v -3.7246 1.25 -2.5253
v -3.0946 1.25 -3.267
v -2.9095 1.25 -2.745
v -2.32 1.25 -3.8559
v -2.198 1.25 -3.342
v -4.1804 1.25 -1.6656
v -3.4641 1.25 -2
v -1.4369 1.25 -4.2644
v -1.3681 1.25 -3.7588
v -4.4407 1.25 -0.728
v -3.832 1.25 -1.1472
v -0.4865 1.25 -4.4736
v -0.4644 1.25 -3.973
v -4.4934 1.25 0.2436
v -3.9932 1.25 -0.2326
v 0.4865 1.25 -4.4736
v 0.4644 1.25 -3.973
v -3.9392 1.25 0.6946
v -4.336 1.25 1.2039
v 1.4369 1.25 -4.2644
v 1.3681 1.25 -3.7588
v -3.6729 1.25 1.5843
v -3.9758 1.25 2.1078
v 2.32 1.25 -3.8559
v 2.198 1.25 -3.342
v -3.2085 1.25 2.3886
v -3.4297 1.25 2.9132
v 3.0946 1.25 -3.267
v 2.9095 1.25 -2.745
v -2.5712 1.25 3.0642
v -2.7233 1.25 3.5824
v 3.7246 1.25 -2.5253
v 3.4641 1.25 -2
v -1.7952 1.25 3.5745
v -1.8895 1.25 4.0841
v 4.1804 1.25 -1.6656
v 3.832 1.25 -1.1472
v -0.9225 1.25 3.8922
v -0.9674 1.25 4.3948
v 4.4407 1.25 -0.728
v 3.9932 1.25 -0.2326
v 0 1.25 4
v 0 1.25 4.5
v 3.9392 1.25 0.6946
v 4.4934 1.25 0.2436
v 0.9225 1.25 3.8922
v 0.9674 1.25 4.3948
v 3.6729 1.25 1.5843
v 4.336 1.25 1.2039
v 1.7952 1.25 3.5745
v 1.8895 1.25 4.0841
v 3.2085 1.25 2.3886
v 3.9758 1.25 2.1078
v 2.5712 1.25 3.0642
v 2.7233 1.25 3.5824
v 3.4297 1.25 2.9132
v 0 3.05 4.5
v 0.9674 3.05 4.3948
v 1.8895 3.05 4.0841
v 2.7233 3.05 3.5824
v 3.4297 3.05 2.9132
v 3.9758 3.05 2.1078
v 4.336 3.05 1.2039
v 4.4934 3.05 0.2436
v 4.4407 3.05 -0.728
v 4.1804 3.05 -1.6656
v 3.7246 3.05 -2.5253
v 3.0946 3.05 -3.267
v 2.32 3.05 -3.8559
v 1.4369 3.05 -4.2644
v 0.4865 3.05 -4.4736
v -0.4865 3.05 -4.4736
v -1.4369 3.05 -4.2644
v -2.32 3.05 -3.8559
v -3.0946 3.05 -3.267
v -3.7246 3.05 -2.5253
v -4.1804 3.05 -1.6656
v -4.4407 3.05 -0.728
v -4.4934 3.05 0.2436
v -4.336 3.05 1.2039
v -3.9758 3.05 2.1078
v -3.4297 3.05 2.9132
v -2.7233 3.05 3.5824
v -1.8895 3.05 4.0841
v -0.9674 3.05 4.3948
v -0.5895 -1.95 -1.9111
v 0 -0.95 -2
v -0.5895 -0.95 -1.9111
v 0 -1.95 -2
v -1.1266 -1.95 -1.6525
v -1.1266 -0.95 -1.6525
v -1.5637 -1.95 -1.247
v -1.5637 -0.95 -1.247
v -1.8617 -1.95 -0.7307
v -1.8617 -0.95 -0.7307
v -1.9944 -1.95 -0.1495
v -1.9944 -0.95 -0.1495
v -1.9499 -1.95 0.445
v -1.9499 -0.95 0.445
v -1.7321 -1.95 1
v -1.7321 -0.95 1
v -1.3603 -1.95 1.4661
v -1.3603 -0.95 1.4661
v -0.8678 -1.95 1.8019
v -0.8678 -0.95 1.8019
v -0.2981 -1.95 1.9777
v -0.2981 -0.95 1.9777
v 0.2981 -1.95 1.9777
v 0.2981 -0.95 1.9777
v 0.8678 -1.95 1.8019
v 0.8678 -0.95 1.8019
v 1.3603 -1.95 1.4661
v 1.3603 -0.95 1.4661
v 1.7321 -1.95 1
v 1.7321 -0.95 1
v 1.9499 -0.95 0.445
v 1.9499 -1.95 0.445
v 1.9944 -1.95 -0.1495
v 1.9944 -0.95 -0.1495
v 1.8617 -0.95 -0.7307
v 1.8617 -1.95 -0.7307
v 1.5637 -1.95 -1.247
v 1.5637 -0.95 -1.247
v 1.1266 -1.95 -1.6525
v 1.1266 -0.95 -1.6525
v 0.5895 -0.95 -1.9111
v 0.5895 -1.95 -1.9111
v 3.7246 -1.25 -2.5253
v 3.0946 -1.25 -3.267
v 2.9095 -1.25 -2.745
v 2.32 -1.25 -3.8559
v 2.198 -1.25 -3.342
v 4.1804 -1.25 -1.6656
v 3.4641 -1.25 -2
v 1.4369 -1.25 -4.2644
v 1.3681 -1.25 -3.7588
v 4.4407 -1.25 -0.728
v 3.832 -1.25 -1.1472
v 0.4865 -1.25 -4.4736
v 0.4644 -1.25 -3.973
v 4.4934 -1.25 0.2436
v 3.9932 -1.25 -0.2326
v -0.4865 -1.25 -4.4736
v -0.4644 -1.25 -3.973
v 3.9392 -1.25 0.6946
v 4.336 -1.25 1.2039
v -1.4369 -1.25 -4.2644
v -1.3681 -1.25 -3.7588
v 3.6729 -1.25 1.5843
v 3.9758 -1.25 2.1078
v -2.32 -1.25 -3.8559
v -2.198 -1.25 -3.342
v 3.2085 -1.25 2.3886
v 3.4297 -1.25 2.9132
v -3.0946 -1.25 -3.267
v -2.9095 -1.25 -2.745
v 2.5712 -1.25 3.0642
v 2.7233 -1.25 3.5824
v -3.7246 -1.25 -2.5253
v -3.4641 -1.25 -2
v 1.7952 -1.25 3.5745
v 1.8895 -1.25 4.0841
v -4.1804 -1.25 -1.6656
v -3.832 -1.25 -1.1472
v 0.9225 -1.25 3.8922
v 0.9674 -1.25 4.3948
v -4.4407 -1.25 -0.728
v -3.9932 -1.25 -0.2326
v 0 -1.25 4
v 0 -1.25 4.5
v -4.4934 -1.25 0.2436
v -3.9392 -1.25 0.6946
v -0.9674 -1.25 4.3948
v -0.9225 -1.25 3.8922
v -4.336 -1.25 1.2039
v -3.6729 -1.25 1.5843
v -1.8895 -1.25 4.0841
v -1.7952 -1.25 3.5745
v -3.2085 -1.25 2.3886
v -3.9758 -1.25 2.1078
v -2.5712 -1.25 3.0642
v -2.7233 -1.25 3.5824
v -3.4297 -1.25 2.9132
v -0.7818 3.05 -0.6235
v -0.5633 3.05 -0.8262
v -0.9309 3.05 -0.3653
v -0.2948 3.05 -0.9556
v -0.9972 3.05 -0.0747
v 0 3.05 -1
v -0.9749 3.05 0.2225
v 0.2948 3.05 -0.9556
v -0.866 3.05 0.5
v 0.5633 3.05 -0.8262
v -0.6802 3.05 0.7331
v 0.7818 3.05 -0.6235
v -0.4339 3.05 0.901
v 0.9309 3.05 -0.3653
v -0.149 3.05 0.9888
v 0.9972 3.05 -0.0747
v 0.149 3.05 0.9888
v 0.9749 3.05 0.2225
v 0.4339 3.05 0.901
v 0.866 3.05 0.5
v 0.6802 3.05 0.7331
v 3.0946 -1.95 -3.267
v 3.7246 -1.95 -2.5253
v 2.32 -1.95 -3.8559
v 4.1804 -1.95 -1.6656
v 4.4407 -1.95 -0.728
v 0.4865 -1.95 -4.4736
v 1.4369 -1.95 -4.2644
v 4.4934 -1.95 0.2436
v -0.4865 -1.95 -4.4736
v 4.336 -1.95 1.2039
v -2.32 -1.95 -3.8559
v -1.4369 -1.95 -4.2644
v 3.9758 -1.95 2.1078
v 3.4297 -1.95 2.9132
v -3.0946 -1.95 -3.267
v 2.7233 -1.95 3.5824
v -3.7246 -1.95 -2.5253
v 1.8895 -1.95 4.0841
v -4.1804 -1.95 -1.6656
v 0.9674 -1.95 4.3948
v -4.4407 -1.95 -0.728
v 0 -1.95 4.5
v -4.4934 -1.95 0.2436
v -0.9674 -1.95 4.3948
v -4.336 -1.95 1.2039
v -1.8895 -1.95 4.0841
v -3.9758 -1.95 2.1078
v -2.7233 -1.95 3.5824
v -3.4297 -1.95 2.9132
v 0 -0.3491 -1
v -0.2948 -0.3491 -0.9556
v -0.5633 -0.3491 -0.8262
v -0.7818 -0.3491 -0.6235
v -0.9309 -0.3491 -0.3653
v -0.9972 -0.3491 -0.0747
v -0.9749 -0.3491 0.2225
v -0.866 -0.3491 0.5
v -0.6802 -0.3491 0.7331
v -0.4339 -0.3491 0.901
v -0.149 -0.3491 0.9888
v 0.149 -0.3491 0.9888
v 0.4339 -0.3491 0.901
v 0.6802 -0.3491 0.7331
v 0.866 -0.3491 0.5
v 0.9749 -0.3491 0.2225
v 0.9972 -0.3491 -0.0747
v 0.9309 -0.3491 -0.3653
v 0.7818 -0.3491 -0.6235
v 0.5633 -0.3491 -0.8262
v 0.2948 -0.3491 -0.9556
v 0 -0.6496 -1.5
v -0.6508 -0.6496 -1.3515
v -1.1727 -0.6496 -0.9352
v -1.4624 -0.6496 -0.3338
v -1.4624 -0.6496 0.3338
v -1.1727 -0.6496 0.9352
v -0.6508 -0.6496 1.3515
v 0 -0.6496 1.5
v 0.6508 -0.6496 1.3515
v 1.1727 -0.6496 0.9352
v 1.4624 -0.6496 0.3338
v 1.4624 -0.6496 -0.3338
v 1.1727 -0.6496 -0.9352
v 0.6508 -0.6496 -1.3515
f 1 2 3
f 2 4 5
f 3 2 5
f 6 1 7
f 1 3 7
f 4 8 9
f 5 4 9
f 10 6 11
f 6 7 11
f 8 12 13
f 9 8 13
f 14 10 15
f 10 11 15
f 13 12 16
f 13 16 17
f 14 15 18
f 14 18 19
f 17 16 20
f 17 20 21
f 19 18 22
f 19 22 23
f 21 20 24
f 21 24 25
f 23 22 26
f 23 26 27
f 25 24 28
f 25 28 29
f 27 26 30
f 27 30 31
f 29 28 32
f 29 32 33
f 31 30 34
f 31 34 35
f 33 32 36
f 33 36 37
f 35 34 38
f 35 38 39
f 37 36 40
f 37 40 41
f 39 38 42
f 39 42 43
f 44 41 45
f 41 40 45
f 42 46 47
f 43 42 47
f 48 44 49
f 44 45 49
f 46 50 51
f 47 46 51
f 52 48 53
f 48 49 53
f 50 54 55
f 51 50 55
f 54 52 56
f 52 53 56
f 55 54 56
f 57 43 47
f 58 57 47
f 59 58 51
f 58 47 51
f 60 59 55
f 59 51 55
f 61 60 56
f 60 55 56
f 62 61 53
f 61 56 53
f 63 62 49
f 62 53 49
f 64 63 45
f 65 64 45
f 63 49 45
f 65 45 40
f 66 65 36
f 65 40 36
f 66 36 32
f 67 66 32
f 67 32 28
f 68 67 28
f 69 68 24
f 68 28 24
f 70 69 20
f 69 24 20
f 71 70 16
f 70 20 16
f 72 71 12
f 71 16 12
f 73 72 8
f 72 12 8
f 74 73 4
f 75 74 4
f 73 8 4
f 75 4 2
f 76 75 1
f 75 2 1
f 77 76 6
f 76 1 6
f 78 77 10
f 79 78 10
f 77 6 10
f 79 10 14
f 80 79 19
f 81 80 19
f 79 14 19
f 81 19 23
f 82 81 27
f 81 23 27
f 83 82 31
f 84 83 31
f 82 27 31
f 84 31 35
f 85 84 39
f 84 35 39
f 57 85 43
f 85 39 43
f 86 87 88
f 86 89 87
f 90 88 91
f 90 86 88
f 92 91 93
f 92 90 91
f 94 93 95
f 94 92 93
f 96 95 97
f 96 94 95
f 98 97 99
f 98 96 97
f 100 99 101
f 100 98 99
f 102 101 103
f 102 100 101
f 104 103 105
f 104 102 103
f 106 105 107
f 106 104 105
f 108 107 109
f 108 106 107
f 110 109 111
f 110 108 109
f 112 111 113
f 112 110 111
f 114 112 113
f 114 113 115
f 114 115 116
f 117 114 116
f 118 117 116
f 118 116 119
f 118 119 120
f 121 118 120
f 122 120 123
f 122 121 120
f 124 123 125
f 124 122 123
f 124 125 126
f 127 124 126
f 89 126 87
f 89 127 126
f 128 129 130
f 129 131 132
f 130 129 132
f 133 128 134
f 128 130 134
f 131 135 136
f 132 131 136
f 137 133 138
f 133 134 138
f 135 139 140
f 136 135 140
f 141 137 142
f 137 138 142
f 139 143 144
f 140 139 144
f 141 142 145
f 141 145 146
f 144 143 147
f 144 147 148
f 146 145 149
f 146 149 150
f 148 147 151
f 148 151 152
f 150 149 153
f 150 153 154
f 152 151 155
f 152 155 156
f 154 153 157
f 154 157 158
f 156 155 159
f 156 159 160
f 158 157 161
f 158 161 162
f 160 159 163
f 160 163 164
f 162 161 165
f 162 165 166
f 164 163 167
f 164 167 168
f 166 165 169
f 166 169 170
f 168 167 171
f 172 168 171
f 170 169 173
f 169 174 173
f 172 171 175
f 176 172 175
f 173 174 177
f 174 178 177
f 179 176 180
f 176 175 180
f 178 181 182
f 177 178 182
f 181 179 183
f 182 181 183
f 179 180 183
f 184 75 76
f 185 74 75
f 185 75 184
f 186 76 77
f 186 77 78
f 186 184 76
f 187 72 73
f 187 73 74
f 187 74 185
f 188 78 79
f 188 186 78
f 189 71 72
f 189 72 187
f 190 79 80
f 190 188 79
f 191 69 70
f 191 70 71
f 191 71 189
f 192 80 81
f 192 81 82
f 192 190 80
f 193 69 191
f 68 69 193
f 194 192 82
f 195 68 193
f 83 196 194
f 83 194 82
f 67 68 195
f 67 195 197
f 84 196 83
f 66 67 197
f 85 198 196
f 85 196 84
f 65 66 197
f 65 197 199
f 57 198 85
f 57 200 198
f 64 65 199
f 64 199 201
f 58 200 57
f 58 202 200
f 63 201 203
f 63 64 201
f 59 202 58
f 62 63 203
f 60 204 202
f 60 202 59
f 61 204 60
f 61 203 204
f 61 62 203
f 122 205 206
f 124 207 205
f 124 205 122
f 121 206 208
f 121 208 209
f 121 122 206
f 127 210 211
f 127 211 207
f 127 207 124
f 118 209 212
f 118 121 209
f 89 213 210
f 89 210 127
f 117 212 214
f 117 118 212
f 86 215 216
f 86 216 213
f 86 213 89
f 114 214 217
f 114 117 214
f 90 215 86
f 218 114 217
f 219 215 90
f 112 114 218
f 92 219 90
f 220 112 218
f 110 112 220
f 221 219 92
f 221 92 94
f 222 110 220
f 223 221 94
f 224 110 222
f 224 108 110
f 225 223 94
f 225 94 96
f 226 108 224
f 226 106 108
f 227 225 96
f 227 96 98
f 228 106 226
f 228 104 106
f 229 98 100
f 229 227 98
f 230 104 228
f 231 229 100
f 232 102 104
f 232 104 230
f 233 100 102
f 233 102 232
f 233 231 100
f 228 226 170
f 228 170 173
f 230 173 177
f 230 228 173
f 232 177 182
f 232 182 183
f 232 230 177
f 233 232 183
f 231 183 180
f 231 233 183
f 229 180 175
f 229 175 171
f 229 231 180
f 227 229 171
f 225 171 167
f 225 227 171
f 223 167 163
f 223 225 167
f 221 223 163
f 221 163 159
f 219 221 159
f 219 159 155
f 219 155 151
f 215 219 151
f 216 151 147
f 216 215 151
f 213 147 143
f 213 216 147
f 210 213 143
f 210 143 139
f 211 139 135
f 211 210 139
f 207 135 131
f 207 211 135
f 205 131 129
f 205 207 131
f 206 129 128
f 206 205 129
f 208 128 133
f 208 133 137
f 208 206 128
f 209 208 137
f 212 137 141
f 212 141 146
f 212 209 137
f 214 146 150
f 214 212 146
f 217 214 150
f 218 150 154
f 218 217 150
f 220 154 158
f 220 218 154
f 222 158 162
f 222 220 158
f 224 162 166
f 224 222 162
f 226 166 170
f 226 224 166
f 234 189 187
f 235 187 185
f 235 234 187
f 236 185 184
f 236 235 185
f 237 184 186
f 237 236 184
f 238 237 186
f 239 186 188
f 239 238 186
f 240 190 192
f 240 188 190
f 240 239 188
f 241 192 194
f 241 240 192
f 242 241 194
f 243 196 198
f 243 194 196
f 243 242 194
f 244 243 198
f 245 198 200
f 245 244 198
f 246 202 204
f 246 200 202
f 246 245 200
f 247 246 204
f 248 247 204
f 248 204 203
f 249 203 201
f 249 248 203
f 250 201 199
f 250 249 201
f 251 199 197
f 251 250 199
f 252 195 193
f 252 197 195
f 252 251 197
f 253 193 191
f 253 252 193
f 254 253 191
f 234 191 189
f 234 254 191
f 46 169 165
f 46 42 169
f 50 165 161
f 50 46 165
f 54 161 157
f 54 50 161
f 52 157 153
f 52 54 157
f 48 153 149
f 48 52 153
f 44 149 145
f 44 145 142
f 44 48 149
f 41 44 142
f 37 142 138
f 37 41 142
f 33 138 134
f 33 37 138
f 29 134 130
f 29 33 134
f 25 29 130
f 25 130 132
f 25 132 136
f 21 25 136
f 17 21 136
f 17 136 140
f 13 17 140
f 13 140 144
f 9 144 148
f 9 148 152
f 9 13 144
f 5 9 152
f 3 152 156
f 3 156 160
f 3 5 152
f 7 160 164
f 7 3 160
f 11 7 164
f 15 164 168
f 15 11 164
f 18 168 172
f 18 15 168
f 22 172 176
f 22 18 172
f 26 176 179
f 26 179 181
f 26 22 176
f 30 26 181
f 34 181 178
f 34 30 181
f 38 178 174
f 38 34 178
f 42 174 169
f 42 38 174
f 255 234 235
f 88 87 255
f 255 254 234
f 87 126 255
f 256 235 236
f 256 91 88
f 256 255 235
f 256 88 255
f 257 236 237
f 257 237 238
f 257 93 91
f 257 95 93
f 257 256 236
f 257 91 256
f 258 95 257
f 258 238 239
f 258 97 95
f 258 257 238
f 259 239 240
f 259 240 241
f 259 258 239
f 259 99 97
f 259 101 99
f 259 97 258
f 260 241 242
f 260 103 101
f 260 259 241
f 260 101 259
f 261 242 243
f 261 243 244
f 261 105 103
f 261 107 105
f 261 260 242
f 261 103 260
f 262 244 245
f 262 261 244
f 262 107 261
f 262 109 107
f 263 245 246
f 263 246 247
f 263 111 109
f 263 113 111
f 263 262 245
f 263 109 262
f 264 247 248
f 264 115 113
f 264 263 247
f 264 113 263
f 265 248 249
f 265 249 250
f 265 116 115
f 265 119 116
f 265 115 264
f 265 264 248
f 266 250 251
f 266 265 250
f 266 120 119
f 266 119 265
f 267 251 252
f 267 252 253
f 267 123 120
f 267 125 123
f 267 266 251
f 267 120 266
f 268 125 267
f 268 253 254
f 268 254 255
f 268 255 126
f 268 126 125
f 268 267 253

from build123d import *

# Parameters (mm, degrees)
ESQUISSE1_R        = 4
BOSS_EXTRU_1_DEPTH = 1.25
ESQUISSE2_R        = 4.5
BOSS_EXTRU_2_DEPTH = 1.8
BOSS_EXTRU_3_START = 0.7
ESQUISSE3_R        = 4.5
BOSS_EXTRU_3_DEPTH = 0.7


with BuildPart() as part:
    # Esquisse1 → Boss.-Extru.1 (new, symmetric)
    with BuildSketch(Plane(origin=(0, 0, 0), x_dir=(1, 0, 0), z_dir=(0, 1, 0))):
        with Locations(Location((0, 0, 0), (0, 0, 270))):
            Circle(ESQUISSE1_R)
    extrude(amount=BOSS_EXTRU_1_DEPTH, both=True)

    # Esquisse2 → Boss.-Extru.2 (add)
    with BuildSketch(Plane(origin=(0, 1.25, 0), x_dir=(1, 0, 0), z_dir=(0, 1, 0))):
        with Locations(Location((0, 0, 0), (0, 0, 270))):
            Circle(ESQUISSE2_R)
    extrude(amount=BOSS_EXTRU_2_DEPTH)

    # Esquisse3 → Boss.-Extru.3 (add)
    with BuildSketch(Plane(origin=(0, -1.25, 0), x_dir=(-1, 0, 0), z_dir=(0, -1, 0)).offset(BOSS_EXTRU_3_START)):
        with Locations(Location((0, 0, 0), (0, 0, 270))):
            Circle(ESQUISSE3_R)
    extrude(amount=-BOSS_EXTRU_3_DEPTH)

    # Esquisse4 → Perçage1 (revolve, cut)
    with BuildSketch(Plane(origin=(0, -1.95, 0), x_dir=(0, 0, -1), z_dir=(1, 0, 0))):
        Polygon((0, 0), (0, 10.600860619), (1, 10), (1, 1.600860619), (2, 1), (2, 0), align=None)
    revolve(axis=Axis((0, -8.080023899, 0), (0, 1, 0)), mode=Mode.SUBTRACT)


solid = part.part
